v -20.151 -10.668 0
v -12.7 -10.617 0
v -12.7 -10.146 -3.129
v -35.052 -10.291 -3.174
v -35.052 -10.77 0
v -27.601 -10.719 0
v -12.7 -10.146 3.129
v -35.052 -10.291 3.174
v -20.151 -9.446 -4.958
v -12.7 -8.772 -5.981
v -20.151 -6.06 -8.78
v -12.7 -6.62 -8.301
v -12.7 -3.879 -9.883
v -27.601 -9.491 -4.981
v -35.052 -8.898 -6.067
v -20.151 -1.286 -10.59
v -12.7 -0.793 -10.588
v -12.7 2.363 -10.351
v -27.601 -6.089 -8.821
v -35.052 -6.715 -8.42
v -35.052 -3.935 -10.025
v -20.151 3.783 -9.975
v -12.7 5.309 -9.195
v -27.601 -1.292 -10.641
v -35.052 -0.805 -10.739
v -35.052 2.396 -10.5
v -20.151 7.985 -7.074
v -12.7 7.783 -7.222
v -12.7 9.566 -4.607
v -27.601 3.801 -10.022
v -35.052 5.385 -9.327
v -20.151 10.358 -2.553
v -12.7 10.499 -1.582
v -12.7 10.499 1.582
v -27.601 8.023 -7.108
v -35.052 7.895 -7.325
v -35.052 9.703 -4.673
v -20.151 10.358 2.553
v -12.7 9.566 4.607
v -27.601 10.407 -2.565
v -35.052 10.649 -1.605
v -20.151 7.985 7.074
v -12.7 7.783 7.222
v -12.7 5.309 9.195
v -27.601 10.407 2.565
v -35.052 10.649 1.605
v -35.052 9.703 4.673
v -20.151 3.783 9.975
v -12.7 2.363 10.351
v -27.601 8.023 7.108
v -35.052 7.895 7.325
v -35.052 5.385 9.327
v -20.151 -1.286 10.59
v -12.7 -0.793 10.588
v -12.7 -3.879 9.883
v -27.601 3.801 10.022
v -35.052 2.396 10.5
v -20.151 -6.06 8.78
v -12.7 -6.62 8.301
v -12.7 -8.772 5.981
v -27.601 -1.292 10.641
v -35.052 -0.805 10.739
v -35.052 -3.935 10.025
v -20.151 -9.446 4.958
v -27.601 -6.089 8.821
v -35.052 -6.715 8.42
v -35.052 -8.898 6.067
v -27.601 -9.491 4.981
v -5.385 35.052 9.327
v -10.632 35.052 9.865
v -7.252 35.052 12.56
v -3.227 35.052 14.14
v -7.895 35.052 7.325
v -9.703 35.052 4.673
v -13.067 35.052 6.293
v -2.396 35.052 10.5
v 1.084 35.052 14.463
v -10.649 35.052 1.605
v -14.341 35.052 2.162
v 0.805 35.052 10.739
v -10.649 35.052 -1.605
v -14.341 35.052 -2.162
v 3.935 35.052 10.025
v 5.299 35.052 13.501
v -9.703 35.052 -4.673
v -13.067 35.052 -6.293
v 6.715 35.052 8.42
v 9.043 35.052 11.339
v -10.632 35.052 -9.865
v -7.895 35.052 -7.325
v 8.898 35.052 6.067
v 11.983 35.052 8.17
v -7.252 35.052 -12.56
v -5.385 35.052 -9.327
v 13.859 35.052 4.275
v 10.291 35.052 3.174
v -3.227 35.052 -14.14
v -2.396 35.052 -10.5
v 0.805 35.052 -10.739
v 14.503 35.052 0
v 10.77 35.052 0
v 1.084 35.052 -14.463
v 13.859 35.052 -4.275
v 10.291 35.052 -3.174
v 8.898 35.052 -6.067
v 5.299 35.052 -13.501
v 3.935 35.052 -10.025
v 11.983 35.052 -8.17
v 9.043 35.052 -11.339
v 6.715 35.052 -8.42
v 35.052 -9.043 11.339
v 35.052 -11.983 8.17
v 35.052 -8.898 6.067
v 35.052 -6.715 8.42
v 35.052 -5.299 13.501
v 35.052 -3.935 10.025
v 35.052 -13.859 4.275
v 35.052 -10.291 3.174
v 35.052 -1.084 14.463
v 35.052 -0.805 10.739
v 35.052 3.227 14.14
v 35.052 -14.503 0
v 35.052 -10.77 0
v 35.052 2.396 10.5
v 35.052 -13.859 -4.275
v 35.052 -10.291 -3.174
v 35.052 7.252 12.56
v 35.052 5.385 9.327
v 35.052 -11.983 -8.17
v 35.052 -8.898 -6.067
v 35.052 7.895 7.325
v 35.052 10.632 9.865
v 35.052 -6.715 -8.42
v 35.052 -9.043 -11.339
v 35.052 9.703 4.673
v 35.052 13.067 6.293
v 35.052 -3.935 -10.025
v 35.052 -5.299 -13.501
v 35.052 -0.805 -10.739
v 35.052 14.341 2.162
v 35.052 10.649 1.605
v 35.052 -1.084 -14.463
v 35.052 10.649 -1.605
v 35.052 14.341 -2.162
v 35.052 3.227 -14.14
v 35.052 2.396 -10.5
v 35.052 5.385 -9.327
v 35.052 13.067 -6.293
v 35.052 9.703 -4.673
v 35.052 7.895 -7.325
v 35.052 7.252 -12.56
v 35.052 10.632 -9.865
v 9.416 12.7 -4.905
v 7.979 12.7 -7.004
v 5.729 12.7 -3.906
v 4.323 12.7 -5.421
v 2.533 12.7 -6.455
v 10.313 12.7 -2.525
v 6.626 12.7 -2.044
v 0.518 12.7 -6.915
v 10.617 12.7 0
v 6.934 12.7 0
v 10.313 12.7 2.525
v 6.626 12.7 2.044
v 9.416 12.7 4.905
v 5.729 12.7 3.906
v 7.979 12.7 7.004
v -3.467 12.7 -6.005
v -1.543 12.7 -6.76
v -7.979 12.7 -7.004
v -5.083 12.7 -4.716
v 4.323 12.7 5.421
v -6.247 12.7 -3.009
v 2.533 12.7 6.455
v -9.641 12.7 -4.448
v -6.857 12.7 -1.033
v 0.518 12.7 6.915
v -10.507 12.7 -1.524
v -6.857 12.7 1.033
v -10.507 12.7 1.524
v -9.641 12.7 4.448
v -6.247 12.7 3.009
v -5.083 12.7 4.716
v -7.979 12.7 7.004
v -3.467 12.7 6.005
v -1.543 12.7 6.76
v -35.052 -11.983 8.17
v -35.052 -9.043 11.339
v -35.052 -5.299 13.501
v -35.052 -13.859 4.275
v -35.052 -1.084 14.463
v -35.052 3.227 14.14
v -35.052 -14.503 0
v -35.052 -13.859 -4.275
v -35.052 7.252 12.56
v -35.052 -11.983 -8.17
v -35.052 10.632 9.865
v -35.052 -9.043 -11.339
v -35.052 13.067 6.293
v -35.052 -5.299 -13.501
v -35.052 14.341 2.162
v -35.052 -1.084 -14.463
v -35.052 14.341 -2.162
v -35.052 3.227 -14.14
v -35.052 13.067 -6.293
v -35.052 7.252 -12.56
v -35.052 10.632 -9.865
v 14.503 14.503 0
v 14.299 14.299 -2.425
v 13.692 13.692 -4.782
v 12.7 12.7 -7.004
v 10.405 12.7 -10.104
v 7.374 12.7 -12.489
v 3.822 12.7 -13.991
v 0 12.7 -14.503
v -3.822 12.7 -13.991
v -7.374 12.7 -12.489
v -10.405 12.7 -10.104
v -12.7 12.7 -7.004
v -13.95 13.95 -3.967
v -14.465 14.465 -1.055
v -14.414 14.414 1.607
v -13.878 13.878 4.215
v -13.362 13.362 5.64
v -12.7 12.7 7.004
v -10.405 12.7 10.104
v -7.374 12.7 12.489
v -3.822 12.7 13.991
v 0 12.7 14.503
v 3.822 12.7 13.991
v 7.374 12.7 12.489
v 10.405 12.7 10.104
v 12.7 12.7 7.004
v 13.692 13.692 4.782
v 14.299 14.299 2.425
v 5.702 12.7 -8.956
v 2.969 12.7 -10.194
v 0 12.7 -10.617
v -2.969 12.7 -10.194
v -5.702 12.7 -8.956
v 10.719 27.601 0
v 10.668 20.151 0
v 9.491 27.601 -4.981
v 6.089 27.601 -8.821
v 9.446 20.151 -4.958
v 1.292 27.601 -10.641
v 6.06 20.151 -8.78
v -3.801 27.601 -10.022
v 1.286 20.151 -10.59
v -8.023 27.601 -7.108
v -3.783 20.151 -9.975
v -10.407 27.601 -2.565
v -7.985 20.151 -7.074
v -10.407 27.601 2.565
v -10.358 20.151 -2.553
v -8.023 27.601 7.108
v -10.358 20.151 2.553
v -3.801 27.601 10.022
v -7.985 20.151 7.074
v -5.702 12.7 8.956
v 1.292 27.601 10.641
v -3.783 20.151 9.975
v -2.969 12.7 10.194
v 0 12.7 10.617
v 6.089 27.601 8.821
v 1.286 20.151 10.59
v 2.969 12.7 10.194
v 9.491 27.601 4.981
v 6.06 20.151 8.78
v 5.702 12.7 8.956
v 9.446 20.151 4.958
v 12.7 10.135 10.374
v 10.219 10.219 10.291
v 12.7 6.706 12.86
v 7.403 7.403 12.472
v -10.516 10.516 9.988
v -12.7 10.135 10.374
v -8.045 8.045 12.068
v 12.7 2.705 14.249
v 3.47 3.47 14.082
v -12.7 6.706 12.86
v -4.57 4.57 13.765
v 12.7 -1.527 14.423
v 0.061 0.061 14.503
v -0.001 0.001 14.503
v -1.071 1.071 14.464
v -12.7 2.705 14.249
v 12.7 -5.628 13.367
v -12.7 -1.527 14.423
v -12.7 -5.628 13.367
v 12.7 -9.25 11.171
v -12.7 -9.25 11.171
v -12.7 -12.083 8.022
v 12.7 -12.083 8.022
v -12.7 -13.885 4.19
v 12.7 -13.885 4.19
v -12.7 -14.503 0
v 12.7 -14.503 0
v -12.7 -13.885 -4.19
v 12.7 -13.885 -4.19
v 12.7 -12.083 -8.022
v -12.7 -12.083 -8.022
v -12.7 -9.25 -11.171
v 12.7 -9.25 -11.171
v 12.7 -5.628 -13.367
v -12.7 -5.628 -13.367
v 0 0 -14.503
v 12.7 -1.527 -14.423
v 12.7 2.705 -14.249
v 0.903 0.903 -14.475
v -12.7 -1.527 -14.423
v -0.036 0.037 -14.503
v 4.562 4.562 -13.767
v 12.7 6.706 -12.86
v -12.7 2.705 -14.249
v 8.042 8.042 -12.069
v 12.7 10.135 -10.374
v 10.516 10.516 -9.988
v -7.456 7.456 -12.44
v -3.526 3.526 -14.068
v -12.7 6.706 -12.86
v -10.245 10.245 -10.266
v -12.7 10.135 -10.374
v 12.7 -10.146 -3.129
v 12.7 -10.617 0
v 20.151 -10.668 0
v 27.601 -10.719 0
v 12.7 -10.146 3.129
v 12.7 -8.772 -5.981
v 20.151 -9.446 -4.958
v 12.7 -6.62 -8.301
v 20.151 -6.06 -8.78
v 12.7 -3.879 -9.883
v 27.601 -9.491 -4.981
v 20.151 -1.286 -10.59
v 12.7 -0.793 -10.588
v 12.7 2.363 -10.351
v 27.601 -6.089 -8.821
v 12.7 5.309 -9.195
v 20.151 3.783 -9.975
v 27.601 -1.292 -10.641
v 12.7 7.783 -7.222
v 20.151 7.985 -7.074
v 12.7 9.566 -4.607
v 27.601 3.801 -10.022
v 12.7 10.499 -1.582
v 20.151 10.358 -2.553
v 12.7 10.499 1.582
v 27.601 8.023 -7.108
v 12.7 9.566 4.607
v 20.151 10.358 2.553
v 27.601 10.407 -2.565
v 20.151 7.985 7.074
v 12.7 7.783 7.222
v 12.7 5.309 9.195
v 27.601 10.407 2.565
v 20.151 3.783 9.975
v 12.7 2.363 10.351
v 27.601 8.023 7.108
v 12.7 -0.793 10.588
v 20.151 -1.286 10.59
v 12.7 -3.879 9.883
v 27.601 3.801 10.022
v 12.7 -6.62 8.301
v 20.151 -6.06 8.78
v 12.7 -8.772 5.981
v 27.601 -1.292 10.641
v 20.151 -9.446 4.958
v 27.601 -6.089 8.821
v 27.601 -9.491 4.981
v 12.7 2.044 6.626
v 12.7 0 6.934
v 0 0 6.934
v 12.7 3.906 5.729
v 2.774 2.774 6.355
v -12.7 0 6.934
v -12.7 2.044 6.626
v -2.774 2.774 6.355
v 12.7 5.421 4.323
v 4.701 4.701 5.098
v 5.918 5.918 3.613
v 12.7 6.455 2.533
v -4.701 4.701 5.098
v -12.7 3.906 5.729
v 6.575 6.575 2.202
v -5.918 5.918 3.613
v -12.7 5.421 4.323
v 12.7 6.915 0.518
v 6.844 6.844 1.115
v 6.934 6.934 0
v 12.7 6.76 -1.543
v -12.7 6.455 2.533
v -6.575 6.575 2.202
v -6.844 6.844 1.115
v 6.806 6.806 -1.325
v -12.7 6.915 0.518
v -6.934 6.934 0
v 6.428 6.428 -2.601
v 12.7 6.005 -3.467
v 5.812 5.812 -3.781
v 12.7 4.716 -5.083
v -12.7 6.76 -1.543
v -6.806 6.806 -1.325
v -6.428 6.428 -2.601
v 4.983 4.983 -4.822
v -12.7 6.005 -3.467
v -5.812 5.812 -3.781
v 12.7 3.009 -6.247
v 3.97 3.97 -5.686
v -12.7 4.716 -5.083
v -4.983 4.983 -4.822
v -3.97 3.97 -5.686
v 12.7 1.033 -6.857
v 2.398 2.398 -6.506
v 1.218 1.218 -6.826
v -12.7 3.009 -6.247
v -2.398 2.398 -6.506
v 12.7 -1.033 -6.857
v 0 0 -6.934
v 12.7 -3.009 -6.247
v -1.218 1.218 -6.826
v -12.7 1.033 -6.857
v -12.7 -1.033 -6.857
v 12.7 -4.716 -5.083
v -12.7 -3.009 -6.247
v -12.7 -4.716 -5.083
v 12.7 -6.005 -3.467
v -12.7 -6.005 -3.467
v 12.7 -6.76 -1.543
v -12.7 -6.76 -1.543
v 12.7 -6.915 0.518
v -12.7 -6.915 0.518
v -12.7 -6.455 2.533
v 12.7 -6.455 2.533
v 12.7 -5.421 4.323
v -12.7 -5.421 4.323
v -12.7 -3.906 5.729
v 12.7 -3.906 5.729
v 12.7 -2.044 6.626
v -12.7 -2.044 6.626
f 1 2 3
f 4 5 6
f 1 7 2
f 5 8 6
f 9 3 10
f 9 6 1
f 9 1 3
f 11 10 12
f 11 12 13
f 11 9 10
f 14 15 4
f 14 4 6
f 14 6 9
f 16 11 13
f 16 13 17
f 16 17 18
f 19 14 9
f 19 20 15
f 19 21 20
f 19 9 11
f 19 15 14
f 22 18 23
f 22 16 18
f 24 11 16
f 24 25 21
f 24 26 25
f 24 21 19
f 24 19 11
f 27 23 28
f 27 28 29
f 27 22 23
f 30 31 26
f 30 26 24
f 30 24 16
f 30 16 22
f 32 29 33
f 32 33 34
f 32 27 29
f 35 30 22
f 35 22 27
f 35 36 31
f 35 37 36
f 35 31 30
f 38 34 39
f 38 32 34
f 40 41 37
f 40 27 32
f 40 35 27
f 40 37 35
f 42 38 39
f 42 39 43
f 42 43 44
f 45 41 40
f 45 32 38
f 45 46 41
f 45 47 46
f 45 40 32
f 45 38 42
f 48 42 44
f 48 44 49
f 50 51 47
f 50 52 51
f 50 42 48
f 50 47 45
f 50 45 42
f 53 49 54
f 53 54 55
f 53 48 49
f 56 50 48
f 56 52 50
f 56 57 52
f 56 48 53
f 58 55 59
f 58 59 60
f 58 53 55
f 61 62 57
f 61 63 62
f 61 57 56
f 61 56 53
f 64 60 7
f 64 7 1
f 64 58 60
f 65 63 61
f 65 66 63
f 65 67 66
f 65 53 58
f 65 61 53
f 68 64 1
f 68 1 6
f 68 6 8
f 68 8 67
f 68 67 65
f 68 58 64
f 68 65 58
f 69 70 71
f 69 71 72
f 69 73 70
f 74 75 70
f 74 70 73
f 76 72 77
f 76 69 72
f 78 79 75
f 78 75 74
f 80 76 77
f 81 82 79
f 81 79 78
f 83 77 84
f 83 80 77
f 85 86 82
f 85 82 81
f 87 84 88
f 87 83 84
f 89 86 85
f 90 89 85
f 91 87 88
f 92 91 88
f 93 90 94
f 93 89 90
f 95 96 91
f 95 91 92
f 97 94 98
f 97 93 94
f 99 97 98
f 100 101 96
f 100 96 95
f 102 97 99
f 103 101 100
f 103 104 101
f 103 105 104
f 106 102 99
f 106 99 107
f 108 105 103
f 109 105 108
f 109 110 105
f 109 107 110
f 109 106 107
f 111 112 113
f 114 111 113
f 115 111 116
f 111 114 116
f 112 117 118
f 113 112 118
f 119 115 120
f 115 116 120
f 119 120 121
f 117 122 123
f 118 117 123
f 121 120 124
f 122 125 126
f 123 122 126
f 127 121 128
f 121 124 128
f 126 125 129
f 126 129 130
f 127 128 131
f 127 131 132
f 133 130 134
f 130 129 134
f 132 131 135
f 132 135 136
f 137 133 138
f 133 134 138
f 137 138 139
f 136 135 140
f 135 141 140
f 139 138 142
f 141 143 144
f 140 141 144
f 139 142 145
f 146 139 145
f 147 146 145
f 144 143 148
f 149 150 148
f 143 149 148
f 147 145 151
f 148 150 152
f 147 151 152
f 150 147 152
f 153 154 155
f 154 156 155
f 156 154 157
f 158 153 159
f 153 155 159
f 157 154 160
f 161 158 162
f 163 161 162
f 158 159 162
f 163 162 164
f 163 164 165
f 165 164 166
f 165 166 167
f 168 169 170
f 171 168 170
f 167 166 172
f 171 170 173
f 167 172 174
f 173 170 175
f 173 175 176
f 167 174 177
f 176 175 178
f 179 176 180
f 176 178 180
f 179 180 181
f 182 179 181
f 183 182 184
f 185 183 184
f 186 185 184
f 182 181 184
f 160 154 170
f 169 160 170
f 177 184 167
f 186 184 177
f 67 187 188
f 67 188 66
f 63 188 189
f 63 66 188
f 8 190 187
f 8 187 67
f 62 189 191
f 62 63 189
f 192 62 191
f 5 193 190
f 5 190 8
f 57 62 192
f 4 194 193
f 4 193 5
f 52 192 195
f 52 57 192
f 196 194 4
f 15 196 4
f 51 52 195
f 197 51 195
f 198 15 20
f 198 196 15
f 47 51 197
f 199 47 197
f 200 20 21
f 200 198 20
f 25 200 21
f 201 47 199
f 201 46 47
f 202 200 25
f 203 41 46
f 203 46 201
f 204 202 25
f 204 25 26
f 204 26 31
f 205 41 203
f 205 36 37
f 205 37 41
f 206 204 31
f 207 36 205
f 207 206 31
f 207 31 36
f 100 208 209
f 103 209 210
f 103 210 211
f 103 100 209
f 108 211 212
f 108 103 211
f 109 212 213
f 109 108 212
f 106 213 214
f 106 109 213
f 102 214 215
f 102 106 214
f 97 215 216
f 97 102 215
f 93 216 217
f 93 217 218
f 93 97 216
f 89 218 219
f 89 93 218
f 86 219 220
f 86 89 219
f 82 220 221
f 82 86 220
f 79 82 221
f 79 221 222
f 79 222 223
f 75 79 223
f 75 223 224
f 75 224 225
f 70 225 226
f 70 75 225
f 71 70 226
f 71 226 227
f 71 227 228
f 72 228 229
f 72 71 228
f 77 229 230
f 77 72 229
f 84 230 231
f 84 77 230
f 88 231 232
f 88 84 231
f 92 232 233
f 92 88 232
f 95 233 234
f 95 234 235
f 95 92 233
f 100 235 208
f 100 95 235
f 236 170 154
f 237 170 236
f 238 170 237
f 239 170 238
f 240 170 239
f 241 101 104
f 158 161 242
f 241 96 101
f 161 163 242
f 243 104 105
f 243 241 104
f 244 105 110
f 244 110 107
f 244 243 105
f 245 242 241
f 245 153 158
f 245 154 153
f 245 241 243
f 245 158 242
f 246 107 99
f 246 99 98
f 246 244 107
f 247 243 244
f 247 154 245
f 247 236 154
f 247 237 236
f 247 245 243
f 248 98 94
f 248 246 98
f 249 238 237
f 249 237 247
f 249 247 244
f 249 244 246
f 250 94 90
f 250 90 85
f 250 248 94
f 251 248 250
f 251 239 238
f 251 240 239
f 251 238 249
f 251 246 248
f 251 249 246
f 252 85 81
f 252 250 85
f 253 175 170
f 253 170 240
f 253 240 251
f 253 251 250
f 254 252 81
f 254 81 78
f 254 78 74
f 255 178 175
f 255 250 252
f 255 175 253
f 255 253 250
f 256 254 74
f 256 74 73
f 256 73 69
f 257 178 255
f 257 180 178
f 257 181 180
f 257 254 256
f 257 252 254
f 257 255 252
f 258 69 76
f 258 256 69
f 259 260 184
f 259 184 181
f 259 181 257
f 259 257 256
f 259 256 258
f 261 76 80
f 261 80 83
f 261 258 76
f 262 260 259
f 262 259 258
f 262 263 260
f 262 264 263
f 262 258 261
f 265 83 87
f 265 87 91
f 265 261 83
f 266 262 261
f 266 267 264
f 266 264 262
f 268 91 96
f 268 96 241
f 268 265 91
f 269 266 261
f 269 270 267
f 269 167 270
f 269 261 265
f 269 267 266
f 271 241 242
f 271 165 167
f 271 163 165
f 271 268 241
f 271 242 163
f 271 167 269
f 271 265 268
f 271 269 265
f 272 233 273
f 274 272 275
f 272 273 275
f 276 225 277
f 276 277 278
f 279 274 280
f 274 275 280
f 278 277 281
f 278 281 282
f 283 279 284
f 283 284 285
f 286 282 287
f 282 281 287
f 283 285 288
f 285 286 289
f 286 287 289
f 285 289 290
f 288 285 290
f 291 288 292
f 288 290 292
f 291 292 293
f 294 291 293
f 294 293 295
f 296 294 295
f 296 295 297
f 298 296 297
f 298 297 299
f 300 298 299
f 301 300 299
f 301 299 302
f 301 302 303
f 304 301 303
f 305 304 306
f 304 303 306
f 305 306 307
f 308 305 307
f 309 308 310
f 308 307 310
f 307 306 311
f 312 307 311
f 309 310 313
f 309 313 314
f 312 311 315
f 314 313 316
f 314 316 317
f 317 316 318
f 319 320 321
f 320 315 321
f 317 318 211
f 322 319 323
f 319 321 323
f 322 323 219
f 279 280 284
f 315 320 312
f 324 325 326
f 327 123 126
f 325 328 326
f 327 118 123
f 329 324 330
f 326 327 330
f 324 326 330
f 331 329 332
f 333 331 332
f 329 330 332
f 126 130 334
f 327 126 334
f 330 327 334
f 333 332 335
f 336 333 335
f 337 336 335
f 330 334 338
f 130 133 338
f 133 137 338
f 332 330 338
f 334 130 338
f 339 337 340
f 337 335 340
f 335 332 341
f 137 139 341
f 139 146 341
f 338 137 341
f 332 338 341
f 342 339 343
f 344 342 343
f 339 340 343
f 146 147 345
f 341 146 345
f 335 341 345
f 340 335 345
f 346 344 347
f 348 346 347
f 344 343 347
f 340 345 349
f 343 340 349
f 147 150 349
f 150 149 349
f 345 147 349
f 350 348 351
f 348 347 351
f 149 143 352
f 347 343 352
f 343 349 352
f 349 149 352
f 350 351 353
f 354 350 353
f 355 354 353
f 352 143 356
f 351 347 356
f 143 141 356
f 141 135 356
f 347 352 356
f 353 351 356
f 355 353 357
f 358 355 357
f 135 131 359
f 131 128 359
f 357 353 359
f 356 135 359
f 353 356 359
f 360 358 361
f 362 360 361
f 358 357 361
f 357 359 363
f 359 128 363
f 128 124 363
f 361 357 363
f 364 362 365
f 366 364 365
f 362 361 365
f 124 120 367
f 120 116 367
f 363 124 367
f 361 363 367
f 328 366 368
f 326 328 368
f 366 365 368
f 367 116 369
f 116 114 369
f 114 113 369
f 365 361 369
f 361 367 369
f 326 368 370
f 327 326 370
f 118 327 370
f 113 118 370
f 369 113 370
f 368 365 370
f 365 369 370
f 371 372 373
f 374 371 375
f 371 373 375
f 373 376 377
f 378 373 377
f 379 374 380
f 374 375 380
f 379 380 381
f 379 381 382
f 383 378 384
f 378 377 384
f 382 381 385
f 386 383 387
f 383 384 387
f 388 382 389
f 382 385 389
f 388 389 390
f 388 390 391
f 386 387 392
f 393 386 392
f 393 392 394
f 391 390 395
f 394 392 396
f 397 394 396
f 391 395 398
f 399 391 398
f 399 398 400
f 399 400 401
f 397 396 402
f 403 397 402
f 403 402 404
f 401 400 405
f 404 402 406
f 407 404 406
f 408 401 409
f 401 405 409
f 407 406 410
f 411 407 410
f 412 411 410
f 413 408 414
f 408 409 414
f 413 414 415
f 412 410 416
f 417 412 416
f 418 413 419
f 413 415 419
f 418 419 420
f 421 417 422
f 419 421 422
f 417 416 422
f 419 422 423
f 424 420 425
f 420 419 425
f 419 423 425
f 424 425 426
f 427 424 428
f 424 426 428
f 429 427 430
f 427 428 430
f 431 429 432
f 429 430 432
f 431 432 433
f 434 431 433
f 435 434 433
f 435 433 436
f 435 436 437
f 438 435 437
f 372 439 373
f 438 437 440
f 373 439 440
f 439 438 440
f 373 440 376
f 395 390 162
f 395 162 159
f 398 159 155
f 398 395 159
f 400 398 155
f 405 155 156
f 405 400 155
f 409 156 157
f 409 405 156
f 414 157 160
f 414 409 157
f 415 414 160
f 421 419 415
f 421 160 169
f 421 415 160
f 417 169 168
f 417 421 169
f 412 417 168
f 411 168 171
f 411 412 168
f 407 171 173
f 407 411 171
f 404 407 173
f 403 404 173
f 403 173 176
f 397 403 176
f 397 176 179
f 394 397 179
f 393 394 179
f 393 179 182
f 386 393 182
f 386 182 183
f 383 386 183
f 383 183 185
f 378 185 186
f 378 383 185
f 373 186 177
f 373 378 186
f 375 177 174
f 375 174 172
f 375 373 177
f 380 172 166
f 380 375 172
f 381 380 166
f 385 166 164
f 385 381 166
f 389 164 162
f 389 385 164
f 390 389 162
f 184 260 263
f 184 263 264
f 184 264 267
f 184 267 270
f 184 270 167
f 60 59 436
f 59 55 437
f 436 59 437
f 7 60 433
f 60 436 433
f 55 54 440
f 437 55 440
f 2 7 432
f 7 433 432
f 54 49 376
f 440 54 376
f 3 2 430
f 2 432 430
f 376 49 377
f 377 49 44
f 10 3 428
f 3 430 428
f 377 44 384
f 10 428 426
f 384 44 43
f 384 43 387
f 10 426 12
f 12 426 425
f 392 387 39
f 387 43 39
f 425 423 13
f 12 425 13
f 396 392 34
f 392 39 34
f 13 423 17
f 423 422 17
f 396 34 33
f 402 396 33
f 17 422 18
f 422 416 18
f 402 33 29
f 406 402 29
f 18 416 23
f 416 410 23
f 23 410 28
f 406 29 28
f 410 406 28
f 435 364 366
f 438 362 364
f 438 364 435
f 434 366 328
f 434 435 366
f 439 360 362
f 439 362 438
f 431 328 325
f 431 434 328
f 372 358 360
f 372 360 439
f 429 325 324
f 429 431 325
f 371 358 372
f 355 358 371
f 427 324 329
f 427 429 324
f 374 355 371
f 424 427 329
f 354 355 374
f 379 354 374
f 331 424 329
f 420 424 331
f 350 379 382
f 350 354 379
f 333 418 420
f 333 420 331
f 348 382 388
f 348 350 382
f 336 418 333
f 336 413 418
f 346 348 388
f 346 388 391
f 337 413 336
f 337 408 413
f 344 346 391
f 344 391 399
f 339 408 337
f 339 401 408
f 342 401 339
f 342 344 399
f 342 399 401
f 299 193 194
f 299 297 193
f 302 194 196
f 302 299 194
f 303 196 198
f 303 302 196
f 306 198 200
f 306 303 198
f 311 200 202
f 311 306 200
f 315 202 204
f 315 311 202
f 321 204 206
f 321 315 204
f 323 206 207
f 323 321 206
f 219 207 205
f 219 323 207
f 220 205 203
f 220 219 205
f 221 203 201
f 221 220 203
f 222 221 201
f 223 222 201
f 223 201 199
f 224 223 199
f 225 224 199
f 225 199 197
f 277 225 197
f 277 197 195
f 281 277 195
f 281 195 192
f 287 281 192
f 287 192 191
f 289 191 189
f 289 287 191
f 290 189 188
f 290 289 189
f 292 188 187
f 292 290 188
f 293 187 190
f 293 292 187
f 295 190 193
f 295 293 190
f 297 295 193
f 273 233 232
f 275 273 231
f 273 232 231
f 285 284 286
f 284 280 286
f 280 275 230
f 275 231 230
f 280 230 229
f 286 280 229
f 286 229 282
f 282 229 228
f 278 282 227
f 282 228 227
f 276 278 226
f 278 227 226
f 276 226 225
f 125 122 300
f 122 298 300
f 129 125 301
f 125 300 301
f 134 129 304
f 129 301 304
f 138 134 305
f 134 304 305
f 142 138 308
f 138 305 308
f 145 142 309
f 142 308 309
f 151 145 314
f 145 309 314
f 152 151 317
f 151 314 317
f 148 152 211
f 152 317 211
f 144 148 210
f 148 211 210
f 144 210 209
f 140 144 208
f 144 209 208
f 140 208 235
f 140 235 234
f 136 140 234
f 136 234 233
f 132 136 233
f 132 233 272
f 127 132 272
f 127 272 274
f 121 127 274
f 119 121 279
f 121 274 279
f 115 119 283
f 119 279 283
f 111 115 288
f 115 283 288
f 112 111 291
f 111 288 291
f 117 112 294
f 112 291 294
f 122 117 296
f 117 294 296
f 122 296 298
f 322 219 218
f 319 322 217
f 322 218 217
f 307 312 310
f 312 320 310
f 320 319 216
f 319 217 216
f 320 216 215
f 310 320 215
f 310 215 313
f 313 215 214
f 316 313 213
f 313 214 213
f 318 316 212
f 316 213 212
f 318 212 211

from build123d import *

# Parameters (mm, degrees)
BOSS_EXTRUDE1_DEPTH = 25.4
BOSS_EXTRUDE2_REACH = 29.203
SKETCH5_R           = 6.9342
CUT_EXTRUDE1_DEPTH  = 25.4
CUT_EXTRUDE2_START  = -12.7
SKETCH6_R           = 6.9342
CUT_EXTRUDE2_DEPTH  = 12.7


with BuildPart() as part:
    # Sketch1 → Revolve1 (revolve)
    with BuildSketch(Plane.XY):
        Polygon((-35.052, -14.5034), (-12.7, -14.5034), (-12.7, -10.6172), (-35.052, -10.7696), align=None)
    revolve(axis=Axis((-35.052, 0, 0), (1, 0, 0)))


with BuildPart() as body_2:
    # Mirror1: mirrored copy
    add(part.part.mirror(Plane(origin=(0, 0, 0), x_dir=(0, 0, 1), z_dir=(1, 0, 0))))


with BuildPart() as body_3:
    # Sketch2 → Revolve2 (revolve)
    with BuildSketch(Plane.XY):
        Polygon((10.7696, 35.052), (10.6172, 12.7), (14.5034, 12.7), (14.5034, 35.052), align=None)
    revolve(axis=Axis((0, 0, 0), (0, 1, 0)))


with BuildPart() as part_1:
    add(part.part)

    add(body_2.part)  # Boss-Extrude1 merges body 2

    add(body_3.part)  # Boss-Extrude1 merges body 3
    # Sketch3 → Boss-Extrude1 (add)
    with BuildSketch(Plane(origin=(-12.7, 0, 0), x_dir=(0, 0, -1), z_dir=(1, 0, 0))):
        with BuildLine():
            Line((7.004185289, 12.7), (-7.004185289, 12.7))
            ThreePointArc((-7.004185289, 12.7), (0, -14.5034), (7.004185289, 12.7))
        make_face()
    extrude(amount=BOSS_EXTRUDE1_DEPTH)

    # Sketch4 → Boss-Extrude2 (add, up to next)
    with BuildSketch(Plane.XZ.offset(-12.7), mode=Mode.PRIVATE) as boss_extrude2_sk1:
        with BuildLine():
            ThreePointArc((-12.7, -7.004185289), (0, -14.5034), (12.7, -7.004185289))
            Line((12.7, -7.004185289), (-12.7, -7.004185289))
        make_face()
    boss_extrude2_tool1 = extrude(boss_extrude2_sk1.sketch, amount=BOSS_EXTRUDE2_REACH, mode=Mode.PRIVATE) - part_1.part
    add(boss_extrude2_tool1.solids().sort_by_distance((0, 12.7, -10.082201))[0])
    # Sketch4 → Boss-Extrude2 (add, up to next)
    with BuildSketch(Plane.XZ.offset(-12.7), mode=Mode.PRIVATE) as boss_extrude2_sk2:
        with BuildLine():
            ThreePointArc((12.7, 7.004185289), (0, 14.5034), (-12.7, 7.004185289))
            Line((-12.7, 7.004185289), (12.7, 7.004185289))
        make_face()
    boss_extrude2_tool2 = extrude(boss_extrude2_sk2.sketch, amount=BOSS_EXTRUDE2_REACH, mode=Mode.PRIVATE) - part_1.part
    add(boss_extrude2_tool2.solids().sort_by_distance((0, 12.7, 10.082201))[0])

    # Sketch5 → Cut-Extrude1 (cut)
    with BuildSketch(Plane.ZY.offset(12.7)):
        Circle(SKETCH5_R)
    extrude(amount=-CUT_EXTRUDE1_DEPTH, mode=Mode.SUBTRACT)

    # Sketch6 → Cut-Extrude2 (cut)
    with BuildSketch(Plane(origin=(0, 12.7, 0), x_dir=(1, 0, 0), z_dir=(0, 1, 0)).offset(CUT_EXTRUDE2_START)):
        Circle(SKETCH6_R)
    extrude(amount=CUT_EXTRUDE2_DEPTH, mode=Mode.SUBTRACT)


solid = part_1.part
